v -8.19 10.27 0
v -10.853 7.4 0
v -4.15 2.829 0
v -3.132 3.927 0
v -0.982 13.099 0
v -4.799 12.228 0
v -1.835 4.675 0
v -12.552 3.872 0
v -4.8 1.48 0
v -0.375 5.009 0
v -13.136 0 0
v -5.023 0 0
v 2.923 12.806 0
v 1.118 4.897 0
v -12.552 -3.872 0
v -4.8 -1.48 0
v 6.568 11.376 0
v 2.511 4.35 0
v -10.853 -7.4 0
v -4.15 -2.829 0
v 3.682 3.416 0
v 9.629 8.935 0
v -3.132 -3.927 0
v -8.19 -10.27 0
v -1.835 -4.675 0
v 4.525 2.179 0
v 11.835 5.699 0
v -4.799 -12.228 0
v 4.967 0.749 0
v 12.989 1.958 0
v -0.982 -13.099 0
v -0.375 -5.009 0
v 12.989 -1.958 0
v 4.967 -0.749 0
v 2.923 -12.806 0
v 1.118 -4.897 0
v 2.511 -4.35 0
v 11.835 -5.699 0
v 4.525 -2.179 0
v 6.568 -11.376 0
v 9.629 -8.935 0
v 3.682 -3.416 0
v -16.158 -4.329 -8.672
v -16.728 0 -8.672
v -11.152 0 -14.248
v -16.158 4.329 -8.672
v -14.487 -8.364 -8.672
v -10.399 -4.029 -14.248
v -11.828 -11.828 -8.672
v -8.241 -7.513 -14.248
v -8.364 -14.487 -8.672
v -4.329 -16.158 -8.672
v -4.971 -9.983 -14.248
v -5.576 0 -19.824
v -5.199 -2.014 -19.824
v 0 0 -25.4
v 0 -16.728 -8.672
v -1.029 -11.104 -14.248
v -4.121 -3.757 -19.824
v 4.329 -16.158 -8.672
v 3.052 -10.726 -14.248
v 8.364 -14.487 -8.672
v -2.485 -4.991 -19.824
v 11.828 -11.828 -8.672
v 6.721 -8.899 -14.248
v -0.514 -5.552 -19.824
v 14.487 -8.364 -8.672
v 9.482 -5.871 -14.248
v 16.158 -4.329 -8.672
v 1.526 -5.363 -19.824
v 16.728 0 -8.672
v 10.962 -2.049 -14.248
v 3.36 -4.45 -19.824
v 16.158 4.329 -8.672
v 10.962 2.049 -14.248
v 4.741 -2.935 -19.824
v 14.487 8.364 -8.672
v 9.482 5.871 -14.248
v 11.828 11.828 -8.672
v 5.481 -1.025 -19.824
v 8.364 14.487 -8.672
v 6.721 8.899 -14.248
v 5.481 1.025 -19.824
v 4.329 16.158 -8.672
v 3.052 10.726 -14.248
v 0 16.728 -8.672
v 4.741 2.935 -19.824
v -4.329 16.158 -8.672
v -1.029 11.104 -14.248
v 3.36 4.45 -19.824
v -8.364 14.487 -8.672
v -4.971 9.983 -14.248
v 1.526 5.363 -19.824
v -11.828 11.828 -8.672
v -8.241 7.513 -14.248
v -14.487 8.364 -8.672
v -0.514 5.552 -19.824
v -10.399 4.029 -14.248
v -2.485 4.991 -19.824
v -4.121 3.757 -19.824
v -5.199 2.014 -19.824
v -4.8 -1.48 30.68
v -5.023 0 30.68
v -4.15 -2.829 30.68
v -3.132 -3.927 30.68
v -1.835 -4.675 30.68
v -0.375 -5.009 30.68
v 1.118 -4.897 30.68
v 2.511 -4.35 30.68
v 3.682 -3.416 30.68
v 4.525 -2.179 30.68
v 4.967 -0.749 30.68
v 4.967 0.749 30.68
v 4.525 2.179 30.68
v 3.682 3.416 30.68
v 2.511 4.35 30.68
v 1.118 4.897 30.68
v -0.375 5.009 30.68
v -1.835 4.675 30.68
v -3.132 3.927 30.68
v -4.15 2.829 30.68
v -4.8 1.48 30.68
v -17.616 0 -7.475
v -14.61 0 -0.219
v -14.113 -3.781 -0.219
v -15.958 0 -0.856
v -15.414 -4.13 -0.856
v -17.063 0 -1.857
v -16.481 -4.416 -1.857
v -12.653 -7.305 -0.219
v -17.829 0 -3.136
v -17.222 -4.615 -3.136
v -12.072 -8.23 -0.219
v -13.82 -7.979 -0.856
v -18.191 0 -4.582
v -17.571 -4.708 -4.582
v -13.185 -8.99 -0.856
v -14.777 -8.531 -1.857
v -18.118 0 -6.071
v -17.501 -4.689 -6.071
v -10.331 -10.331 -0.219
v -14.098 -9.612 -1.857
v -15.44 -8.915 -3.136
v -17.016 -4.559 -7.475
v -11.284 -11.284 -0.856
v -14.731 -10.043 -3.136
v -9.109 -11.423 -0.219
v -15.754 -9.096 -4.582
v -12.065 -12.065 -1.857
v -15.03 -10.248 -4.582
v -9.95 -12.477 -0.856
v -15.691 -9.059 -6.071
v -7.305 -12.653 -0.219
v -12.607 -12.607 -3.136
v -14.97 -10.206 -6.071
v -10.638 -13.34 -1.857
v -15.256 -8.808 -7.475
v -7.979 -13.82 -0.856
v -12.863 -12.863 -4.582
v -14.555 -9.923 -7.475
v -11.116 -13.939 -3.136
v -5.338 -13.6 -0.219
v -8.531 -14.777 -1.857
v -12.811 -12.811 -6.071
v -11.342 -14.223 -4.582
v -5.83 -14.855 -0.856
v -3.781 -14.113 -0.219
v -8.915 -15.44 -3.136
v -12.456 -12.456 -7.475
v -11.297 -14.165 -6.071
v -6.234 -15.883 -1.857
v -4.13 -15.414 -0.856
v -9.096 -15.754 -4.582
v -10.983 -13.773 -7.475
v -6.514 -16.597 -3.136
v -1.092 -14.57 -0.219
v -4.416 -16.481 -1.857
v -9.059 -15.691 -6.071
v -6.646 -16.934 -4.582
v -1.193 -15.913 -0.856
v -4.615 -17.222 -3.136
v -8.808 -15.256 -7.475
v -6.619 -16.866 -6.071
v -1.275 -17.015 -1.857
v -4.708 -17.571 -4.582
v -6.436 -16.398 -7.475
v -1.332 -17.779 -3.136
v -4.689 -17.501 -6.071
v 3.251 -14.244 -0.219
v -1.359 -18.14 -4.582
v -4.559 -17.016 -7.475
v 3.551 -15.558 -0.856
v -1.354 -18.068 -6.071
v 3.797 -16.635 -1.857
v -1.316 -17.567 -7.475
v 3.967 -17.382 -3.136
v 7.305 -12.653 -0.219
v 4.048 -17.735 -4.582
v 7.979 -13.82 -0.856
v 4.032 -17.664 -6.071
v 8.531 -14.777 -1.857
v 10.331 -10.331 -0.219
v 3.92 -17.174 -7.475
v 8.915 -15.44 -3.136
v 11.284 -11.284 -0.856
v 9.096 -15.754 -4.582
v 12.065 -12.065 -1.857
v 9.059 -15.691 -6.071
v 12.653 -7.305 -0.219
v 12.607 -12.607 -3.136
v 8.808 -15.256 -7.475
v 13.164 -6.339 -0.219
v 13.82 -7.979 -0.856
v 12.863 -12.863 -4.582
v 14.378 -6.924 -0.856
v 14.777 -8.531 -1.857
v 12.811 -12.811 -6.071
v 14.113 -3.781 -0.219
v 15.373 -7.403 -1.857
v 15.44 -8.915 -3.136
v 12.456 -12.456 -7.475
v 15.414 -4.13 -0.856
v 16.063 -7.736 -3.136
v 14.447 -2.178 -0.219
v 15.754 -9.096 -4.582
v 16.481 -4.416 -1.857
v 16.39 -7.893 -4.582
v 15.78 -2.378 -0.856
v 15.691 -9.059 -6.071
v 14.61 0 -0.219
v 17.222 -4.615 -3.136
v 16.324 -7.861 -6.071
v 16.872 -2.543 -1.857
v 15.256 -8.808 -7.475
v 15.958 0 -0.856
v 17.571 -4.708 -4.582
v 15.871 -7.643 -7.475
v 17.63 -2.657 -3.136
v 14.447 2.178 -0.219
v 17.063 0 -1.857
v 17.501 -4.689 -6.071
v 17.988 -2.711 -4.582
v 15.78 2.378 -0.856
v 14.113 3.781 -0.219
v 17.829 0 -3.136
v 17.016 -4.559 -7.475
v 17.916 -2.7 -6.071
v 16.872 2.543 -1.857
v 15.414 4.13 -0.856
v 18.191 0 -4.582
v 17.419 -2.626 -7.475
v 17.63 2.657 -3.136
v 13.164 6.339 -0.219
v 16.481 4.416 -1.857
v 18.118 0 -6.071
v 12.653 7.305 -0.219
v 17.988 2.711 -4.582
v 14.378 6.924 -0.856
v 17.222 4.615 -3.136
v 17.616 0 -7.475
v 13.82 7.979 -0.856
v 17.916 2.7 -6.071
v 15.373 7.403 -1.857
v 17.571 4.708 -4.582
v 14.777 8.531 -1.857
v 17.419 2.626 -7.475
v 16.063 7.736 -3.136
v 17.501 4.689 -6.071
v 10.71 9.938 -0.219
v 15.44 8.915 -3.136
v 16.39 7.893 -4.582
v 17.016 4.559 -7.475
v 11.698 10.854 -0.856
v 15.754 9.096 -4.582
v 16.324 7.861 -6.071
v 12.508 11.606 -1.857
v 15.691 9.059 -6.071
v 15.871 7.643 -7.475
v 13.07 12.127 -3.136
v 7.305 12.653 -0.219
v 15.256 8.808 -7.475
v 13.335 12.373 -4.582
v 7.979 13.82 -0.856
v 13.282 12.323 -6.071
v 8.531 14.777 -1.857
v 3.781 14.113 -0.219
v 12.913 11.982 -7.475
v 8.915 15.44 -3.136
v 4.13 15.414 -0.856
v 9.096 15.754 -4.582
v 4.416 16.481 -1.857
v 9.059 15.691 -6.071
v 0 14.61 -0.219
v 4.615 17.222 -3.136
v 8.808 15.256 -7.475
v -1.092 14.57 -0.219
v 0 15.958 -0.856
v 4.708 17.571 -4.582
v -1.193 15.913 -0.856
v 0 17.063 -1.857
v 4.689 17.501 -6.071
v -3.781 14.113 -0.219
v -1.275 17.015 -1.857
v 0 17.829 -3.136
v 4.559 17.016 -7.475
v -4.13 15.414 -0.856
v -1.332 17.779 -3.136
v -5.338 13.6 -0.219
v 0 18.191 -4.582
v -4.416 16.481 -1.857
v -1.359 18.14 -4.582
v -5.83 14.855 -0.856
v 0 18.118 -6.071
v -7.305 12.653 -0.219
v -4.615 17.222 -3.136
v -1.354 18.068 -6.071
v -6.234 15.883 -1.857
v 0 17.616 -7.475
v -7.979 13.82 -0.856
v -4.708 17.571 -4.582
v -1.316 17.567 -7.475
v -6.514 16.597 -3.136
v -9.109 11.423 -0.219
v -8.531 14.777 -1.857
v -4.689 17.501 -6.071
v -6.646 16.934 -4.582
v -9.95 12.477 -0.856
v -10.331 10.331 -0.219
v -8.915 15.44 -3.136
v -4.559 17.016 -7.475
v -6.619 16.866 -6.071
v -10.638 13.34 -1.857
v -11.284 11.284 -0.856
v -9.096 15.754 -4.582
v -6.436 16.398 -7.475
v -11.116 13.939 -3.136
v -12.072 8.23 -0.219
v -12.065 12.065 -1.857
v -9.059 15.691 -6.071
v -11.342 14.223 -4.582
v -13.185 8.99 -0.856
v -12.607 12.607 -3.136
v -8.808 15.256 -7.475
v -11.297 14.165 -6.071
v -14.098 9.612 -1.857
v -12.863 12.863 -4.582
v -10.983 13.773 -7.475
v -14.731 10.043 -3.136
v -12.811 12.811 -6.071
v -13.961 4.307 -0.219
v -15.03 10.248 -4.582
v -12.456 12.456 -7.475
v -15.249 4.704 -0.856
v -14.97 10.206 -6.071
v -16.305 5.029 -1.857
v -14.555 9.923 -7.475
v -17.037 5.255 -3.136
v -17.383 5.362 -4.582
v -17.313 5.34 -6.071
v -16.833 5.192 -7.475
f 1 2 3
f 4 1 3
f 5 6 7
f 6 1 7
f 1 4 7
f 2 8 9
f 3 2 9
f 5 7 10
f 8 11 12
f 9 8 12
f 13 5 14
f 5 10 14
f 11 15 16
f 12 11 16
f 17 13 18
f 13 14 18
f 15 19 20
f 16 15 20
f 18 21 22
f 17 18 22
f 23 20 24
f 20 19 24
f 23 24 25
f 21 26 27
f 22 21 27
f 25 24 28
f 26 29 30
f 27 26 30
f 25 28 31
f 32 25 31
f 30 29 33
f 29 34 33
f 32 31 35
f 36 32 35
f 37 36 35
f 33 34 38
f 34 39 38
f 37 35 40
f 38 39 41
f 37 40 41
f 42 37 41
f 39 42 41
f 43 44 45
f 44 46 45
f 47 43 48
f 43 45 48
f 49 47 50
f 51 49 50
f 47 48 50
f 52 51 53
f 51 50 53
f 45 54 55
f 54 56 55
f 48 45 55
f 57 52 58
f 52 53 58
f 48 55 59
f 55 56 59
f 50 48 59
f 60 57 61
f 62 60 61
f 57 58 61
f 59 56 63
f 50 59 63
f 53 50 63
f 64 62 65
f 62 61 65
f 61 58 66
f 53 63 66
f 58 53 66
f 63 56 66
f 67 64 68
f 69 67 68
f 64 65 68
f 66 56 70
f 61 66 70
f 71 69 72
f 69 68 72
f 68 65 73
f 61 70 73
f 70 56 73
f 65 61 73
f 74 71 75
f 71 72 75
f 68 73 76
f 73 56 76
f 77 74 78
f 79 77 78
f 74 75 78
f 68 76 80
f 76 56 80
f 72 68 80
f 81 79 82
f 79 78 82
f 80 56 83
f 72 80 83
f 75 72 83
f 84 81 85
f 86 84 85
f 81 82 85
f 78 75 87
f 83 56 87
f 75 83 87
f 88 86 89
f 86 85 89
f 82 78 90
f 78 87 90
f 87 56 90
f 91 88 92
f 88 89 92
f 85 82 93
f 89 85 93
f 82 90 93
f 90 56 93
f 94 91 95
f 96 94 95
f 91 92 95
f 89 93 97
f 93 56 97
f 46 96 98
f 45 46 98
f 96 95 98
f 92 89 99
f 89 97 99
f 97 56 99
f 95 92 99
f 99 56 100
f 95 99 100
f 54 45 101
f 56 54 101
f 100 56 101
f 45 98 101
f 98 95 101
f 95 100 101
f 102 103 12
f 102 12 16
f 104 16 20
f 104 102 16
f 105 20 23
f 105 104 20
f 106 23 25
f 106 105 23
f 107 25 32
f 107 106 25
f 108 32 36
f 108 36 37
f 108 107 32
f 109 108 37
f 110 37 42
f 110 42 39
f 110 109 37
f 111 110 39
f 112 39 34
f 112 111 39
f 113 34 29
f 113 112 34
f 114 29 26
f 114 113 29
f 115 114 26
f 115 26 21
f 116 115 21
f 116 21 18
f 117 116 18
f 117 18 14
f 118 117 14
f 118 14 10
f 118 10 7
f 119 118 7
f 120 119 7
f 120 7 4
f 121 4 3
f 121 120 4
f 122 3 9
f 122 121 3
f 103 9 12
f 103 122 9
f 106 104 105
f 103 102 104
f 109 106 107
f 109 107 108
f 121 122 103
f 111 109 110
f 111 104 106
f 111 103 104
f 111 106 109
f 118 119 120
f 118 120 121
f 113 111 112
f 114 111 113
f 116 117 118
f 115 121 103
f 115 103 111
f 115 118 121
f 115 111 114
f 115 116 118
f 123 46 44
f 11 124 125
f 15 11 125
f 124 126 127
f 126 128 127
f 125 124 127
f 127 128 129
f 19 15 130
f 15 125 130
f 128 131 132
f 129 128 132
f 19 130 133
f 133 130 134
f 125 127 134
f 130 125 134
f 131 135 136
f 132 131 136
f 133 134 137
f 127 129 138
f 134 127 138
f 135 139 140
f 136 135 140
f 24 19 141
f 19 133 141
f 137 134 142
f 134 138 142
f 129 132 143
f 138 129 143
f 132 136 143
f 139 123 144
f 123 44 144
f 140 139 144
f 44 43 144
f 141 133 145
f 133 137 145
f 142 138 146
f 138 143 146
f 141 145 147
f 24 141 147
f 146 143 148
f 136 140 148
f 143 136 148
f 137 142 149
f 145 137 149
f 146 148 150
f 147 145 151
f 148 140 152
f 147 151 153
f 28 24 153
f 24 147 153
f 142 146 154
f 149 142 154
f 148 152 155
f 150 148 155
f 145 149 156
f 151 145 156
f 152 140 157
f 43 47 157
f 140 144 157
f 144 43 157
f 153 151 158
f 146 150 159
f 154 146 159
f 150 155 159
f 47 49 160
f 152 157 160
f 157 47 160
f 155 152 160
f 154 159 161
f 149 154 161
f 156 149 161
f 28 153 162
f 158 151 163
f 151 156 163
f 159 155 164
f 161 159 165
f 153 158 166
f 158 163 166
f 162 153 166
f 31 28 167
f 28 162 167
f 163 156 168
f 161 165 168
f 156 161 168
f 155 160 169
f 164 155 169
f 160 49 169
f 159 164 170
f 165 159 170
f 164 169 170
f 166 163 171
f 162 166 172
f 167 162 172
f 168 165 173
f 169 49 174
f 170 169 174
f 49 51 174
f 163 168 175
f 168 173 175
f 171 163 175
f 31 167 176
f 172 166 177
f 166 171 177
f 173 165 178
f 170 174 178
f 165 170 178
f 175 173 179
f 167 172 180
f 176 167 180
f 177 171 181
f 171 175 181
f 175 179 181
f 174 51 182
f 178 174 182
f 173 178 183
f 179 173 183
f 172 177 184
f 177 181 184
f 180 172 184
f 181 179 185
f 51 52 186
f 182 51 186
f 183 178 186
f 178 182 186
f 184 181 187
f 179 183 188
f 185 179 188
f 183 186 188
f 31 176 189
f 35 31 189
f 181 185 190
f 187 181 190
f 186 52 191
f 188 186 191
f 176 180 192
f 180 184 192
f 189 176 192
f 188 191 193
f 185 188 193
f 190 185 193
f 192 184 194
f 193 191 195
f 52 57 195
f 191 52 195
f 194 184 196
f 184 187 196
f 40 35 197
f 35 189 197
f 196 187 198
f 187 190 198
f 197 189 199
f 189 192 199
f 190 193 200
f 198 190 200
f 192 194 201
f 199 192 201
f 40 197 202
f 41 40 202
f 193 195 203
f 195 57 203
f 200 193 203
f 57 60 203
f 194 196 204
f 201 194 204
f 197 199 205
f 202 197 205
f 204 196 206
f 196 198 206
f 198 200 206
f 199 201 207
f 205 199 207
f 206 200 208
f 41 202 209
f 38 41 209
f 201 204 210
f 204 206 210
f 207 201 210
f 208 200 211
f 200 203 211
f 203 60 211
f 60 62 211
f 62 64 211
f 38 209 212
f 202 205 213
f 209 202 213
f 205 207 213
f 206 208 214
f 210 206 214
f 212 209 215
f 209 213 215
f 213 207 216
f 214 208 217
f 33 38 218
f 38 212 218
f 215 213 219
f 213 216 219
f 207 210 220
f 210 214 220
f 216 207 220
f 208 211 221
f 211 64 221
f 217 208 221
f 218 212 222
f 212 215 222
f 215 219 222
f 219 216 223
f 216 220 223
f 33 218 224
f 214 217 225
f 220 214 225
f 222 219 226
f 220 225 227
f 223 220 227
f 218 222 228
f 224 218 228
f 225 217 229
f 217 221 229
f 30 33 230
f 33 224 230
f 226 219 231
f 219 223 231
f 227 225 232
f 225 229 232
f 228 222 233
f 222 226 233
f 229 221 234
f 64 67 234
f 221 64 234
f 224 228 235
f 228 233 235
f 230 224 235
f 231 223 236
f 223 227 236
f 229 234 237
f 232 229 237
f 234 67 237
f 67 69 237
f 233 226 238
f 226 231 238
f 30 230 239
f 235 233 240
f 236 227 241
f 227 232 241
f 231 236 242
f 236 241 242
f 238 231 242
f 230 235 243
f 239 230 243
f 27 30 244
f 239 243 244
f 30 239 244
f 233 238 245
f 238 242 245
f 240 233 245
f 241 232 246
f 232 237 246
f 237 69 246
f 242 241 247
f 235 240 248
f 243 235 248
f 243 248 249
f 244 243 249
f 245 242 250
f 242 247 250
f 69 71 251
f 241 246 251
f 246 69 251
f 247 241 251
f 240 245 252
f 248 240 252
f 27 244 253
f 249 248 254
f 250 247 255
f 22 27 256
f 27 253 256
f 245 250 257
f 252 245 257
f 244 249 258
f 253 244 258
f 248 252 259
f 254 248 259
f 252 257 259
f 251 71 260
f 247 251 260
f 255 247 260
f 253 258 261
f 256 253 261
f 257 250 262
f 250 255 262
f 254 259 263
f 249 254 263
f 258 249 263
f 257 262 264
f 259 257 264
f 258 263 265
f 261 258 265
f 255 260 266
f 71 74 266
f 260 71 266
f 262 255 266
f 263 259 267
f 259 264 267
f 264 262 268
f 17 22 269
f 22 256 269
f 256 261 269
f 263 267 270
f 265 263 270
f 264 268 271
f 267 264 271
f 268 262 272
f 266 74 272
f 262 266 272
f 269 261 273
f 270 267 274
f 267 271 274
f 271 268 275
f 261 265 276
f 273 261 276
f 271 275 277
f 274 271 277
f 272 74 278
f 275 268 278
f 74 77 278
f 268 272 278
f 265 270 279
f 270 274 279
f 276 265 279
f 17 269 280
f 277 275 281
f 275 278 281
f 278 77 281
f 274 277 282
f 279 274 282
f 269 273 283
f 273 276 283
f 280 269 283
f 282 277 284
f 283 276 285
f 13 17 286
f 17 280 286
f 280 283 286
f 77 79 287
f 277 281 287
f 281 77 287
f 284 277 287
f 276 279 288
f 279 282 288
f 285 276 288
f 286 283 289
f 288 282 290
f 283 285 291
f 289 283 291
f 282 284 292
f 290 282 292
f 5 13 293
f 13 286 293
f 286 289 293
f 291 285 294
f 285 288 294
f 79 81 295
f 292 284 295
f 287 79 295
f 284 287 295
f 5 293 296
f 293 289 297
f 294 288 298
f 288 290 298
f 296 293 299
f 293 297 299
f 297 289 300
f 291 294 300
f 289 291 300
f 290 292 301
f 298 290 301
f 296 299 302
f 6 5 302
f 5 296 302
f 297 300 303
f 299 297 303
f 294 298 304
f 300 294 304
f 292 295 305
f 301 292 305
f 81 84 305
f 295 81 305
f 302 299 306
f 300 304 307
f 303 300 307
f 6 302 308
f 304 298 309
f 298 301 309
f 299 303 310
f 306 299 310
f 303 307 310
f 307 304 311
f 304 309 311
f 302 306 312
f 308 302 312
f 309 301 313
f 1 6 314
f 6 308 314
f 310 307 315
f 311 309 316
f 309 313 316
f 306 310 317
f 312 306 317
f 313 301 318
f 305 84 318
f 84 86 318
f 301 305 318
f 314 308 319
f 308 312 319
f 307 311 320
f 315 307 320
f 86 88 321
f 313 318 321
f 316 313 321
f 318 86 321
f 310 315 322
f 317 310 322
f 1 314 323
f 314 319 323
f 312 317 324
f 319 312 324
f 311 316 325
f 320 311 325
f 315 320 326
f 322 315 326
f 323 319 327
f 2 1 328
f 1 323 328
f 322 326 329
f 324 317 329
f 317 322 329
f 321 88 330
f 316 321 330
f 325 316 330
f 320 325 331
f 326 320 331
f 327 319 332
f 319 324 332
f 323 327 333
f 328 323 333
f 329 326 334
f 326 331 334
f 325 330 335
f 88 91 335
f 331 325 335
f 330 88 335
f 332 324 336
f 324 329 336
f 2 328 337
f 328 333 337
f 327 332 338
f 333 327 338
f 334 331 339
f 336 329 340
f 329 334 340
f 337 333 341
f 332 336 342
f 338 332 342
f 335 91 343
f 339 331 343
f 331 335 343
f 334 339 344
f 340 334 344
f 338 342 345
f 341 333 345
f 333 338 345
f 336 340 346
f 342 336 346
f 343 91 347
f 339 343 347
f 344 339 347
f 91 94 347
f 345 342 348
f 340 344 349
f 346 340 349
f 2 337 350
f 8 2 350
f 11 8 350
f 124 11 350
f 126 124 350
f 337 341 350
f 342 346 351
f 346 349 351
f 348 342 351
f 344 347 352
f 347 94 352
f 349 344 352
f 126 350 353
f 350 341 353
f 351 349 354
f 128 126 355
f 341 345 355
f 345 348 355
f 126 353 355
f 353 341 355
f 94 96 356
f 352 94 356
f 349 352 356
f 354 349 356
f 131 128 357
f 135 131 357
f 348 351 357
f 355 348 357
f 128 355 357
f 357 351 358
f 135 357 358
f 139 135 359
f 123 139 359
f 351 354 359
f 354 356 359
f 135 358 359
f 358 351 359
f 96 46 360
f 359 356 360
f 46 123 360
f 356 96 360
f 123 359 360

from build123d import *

# Parameters (mm, degrees)
F0_W     = 5.0226673484
F0_H     = 50.8
F2_R     = 5.08
F4_W     = 74.5882093906
F4_H     = 114.3385246396
F5_DEPTH = 21.6480400413


with BuildPart() as f1:
    # F0 (on Front) → F1 (revolve)
    with BuildSketch(Plane.XZ):
        Polygon((0, -25.4), (0, 0), (-5.0226673484, 0), (-25.4, 0), align=None)
        with Locations((-2.5113336742, 25.4)):
            Rectangle(F0_W, F0_H)
    revolve(axis=Axis((0, 0, 25.4), (0, 0, 1)))

    # F2
    f2_edges = [f1.edges().sort_by_distance(p)[0] for p in [
        (25.4, 0, 0),
    ]]
    fillet(f2_edges, radius=F2_R)

    # F4 (on offset) → F5 (cut)
    with BuildSketch(Plane.XY.offset(52.3276198655)):
        with Locations((8.5238665342, 15.934009105)):
            Rectangle(F4_W, F4_H)
    extrude(amount=-F5_DEPTH, mode=Mode.SUBTRACT)


solid = f1.part
